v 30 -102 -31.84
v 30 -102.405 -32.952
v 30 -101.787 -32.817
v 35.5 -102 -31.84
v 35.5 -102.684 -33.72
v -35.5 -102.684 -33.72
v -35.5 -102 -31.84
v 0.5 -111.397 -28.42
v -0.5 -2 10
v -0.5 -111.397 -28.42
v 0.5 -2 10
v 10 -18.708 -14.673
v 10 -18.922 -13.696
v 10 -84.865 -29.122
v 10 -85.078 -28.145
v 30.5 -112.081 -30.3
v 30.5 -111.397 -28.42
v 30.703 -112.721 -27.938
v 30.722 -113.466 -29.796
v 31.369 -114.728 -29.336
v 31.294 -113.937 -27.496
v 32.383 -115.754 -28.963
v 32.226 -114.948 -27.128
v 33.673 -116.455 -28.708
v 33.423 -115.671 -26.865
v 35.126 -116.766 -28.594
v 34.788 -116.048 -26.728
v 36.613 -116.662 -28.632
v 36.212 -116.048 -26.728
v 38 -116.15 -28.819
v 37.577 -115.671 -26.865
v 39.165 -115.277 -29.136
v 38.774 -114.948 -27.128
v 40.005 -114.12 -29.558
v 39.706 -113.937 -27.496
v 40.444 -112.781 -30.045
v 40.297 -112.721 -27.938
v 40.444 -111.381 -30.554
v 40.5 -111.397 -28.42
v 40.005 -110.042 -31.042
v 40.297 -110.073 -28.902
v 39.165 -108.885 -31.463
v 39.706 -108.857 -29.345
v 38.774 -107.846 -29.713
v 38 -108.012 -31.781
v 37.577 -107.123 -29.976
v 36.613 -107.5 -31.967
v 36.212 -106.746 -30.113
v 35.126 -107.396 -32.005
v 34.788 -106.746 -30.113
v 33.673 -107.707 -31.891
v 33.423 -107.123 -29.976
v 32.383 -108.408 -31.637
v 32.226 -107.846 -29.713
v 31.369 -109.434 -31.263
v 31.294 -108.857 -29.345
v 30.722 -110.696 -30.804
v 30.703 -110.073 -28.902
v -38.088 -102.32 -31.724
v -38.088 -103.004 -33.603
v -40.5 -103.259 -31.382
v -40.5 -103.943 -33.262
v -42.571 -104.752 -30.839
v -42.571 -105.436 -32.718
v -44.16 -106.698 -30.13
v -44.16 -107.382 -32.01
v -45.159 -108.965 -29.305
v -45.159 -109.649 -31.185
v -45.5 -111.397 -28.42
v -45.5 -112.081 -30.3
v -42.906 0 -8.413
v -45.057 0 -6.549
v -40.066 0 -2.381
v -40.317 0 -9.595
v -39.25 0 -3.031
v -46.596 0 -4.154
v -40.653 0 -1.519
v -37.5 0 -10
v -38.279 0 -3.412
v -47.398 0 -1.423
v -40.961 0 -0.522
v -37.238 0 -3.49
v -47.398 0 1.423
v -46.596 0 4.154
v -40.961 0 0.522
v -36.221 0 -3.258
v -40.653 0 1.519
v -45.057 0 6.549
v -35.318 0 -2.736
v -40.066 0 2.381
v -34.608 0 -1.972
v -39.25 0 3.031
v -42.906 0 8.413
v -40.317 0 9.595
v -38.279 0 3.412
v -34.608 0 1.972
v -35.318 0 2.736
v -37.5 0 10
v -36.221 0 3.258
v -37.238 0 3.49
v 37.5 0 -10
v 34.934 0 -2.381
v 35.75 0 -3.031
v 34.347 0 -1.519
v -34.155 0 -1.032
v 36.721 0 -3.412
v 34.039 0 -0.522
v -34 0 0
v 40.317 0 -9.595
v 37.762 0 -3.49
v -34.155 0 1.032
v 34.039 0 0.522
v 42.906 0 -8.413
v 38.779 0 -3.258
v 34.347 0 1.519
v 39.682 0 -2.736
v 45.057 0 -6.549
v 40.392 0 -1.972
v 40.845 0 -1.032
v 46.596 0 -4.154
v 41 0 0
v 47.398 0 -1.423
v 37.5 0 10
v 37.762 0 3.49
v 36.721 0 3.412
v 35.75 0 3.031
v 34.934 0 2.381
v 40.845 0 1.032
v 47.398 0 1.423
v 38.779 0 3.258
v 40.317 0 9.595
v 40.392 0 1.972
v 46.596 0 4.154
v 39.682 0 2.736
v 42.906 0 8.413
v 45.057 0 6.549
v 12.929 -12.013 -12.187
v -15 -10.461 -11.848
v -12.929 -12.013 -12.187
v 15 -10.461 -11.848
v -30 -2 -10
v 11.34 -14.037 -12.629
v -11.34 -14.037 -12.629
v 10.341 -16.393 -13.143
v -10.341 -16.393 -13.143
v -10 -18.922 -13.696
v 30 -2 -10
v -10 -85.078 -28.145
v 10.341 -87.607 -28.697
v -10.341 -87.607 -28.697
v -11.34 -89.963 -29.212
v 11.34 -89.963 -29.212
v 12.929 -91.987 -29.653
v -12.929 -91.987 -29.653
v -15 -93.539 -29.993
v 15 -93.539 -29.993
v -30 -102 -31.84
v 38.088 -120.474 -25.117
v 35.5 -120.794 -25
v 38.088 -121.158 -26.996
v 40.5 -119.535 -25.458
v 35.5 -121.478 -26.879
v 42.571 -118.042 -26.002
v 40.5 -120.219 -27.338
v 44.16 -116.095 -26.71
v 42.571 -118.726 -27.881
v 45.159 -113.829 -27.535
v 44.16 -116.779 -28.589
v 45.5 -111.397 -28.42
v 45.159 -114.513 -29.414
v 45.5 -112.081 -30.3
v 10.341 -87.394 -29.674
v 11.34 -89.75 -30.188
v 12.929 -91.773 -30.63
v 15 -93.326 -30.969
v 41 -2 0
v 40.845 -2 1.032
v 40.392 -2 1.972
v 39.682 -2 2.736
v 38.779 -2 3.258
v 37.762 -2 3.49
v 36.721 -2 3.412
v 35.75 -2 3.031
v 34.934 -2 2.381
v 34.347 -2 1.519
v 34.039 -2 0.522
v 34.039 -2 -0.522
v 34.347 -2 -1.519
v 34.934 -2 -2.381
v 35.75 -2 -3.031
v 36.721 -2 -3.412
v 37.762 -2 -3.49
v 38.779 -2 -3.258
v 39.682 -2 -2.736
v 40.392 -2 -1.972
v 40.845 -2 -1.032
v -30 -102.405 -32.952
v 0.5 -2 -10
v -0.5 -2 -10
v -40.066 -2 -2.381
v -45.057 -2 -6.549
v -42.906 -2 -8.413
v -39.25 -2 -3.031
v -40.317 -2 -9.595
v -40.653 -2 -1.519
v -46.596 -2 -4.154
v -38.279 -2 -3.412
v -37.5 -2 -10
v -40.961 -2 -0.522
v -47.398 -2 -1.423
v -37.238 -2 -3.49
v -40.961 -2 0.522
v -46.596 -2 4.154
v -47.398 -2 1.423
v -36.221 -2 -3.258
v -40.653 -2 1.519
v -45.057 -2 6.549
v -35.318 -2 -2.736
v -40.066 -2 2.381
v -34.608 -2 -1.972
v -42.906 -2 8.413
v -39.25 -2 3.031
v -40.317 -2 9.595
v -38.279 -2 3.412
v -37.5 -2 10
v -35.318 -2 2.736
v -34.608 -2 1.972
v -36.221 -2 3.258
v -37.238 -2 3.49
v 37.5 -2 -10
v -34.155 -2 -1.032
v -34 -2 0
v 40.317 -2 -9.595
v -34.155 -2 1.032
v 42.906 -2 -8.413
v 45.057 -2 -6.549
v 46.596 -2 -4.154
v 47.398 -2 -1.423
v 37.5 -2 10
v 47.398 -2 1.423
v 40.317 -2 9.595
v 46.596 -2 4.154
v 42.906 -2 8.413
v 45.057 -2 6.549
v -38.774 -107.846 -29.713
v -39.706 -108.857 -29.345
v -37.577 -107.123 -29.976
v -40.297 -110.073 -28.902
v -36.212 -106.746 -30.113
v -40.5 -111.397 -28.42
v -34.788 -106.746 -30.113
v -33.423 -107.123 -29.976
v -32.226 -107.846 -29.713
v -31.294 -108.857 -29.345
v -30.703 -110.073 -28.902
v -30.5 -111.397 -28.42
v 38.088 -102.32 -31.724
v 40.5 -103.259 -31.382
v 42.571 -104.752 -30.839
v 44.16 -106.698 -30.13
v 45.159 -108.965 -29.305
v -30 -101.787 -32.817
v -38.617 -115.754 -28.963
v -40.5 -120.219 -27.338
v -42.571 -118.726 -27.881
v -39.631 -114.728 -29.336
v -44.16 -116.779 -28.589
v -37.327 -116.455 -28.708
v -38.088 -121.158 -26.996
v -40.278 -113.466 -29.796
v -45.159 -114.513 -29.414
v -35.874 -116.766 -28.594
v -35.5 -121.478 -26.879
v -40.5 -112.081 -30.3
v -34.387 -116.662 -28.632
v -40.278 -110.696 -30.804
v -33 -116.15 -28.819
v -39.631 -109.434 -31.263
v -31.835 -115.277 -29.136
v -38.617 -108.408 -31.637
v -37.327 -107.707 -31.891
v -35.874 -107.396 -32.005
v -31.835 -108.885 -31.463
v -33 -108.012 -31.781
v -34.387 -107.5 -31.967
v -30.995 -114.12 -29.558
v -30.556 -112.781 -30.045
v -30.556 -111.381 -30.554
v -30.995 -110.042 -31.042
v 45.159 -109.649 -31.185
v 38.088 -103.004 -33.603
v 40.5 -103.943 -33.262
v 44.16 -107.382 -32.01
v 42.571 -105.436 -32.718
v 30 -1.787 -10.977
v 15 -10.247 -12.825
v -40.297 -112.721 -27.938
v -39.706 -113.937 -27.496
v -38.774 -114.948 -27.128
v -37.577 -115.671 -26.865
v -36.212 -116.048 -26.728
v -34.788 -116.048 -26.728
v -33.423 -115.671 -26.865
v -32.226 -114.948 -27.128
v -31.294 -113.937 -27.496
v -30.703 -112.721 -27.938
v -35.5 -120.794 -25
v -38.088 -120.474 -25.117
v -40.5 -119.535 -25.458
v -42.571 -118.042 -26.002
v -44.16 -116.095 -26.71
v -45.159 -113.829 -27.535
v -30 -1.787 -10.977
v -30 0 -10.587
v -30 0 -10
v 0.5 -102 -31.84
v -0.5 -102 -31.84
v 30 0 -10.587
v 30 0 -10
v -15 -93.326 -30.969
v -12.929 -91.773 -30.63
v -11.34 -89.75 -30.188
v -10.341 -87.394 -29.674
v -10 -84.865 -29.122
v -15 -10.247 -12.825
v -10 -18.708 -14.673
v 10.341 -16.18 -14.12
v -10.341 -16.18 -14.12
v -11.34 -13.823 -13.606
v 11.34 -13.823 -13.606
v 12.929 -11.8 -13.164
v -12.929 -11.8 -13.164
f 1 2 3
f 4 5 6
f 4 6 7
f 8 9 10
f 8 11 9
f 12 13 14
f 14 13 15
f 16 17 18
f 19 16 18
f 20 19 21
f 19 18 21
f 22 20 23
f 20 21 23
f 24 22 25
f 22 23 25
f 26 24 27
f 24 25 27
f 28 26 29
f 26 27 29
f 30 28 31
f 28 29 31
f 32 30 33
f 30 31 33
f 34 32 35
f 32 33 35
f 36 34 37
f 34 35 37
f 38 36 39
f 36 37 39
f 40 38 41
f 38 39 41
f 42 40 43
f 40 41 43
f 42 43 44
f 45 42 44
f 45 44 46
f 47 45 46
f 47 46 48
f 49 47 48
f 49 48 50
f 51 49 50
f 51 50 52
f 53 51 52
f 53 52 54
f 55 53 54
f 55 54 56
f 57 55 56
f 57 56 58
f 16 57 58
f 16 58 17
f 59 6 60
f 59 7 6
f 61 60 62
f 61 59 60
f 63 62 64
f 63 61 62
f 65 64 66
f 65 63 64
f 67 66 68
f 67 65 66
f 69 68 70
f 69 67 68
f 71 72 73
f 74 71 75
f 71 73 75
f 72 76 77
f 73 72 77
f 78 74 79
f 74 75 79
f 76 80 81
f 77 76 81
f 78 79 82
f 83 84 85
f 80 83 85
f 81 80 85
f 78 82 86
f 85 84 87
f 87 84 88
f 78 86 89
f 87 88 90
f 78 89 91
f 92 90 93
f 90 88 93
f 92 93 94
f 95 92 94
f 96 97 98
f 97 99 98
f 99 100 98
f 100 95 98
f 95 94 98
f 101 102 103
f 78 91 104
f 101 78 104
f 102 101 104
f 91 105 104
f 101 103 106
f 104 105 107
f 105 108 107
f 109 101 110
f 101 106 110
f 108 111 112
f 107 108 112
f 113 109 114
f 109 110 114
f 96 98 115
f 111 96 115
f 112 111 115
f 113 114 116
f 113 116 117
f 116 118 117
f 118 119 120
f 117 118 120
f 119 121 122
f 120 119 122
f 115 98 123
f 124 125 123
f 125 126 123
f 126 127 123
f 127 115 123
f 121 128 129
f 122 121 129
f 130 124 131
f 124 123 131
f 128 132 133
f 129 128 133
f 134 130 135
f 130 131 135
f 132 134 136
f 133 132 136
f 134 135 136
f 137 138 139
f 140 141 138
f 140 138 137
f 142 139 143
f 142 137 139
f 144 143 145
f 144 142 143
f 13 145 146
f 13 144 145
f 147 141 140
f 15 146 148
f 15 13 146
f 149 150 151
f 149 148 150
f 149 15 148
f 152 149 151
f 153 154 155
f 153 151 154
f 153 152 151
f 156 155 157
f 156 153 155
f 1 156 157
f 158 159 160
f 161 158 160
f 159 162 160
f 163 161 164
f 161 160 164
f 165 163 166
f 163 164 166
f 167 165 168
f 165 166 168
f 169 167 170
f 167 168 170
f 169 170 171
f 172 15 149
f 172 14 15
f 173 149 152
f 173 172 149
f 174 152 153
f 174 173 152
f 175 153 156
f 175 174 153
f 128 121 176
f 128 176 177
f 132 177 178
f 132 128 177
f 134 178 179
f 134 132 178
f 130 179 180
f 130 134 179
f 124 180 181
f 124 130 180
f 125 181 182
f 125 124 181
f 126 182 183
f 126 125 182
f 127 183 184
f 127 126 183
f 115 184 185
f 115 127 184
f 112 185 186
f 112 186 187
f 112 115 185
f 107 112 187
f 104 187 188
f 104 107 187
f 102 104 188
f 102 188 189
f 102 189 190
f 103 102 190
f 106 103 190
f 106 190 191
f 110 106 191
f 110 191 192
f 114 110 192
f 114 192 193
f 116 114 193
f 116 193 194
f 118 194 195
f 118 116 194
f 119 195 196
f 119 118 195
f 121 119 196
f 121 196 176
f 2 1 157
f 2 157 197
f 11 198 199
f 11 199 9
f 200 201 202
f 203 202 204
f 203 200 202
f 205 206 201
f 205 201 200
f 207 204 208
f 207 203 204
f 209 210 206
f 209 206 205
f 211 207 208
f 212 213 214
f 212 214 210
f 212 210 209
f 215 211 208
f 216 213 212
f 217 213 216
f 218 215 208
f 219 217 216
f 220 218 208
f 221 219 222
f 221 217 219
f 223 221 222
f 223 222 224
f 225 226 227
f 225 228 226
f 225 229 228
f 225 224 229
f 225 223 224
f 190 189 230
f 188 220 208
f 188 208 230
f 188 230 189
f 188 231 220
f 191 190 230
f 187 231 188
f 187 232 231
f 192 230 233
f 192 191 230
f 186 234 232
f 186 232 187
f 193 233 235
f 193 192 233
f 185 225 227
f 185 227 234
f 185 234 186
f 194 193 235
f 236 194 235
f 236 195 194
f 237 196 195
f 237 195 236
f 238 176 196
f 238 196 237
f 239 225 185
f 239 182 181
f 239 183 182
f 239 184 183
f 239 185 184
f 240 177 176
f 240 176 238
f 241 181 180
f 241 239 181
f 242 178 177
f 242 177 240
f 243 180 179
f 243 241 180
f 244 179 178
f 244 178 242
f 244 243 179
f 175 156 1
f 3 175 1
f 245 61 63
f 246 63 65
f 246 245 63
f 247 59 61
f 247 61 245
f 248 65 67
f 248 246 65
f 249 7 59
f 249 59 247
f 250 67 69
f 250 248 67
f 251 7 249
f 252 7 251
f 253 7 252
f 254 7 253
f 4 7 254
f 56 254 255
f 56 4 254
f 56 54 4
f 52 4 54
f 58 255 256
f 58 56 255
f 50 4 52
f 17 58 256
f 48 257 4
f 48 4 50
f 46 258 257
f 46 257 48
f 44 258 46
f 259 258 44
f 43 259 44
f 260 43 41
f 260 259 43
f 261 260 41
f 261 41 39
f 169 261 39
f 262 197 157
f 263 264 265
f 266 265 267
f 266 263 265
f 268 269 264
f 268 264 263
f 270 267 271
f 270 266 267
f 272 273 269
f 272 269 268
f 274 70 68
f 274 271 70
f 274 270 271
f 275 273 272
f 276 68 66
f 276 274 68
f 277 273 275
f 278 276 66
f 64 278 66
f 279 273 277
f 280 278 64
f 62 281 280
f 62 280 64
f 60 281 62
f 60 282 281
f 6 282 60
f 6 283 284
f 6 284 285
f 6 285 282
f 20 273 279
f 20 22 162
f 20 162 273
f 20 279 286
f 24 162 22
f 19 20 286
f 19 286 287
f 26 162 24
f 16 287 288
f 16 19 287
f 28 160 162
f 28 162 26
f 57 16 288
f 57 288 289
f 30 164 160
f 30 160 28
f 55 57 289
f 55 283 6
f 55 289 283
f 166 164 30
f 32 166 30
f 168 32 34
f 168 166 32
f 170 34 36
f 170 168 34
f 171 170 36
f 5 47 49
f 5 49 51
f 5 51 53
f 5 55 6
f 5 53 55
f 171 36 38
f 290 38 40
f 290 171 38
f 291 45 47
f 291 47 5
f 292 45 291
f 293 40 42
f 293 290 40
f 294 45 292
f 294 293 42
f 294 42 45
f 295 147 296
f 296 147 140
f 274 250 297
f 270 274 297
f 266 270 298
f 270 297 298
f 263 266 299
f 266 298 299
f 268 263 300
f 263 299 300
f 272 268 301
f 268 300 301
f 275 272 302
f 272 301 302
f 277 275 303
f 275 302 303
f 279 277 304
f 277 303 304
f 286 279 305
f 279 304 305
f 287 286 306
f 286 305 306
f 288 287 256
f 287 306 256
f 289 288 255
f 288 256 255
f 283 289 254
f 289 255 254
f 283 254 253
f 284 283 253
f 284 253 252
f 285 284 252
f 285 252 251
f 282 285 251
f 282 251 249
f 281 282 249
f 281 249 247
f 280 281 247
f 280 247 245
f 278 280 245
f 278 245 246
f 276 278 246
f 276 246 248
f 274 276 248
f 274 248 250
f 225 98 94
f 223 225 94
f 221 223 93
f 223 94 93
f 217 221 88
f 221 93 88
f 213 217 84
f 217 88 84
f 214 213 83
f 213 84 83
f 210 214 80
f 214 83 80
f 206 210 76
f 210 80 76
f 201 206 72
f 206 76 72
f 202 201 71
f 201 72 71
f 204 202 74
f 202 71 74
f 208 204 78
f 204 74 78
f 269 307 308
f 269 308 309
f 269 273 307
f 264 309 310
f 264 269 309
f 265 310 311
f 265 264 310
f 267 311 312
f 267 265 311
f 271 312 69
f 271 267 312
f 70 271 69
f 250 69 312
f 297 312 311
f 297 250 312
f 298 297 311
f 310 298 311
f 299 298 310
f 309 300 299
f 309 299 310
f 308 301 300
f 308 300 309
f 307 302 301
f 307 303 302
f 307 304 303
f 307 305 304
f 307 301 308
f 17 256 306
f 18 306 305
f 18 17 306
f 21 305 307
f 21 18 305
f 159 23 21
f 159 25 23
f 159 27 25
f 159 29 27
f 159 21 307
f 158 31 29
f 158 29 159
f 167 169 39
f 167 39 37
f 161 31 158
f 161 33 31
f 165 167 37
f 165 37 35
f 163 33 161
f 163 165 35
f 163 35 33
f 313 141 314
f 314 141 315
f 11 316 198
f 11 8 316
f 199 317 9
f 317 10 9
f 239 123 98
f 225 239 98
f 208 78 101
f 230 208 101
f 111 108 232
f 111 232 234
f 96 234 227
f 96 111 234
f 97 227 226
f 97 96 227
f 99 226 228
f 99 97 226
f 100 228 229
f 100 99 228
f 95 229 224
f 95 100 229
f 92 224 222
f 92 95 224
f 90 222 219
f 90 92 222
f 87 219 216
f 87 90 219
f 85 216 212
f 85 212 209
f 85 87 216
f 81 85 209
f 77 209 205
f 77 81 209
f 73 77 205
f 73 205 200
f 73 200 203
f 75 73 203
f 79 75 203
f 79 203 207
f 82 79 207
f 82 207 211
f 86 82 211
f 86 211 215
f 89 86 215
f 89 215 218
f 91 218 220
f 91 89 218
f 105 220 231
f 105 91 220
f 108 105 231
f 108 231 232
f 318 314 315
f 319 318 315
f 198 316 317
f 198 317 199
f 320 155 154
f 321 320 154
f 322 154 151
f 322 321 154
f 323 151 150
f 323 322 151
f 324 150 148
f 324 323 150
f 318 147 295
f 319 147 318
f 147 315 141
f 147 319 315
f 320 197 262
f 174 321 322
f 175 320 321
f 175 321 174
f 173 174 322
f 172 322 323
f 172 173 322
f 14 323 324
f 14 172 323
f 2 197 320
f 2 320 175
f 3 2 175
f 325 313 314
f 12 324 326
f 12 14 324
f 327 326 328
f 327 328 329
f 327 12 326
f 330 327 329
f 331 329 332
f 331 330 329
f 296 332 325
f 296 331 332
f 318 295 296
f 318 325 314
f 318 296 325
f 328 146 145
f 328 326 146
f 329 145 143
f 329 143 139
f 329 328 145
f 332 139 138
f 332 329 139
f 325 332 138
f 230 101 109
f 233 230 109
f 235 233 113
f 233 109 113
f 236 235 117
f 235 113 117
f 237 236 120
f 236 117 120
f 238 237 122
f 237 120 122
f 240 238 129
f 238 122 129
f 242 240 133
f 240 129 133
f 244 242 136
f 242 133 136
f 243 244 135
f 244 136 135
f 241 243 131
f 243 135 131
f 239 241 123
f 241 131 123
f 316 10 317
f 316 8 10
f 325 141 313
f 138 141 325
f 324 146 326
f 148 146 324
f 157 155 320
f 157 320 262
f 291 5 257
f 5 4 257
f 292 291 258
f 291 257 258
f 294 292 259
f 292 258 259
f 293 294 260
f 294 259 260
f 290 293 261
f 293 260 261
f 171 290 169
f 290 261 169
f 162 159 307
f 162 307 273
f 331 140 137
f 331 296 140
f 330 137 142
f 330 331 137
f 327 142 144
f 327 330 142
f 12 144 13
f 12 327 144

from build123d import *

# Parameters (mm, degrees)
F0_R      = 3.5
F1_DEPTH  = 2
F3_DEPTH  = 0.5
F4_DEPTH  = 45.5
F5_R      = 9.99999
F7_D      = 10
F9_DEPTH  = 30
F11_DEPTH = 23.6012824615
F12_R     = 10


# Not quite as in the source:
# - a fillet or chamfer is up to 0.001 mm smaller than in the source, because OpenCascade refuses the exact size
# - a pattern or mirror of a feature is missing from the dataset's text; its kind, count and spacing are read off the source's solid


with BuildPart() as f1:
    # F0 (on Front) → F1 (new body)
    with BuildSketch(Plane.XZ):
        with BuildLine():
            Line((37.5, 10), (-37.5, 10))
            ThreePointArc((-37.5, 10), (-47.5, 0), (-37.5, -10))
            Line((-37.5, -10), (37.5, -10))
            ThreePointArc((37.5, -10), (47.5, 0), (37.5, 10))
        make_face()
        with Locations((-37.5, 0)):
            Circle(F0_R, mode=Mode.SUBTRACT)
        with Locations((37.5, 0)):
            Circle(F0_R, mode=Mode.SUBTRACT)
    extrude(amount=F1_DEPTH)


with BuildPart() as f3:
    # F2 (on Right) → F3 (new body, symmetric)
    with BuildSketch(Plane.YZ):
        Polygon((-111.3969262079, -28.4202014333), (-102, -31.8404028665), (-2, -10), (-2, 10), align=None)
    extrude(amount=F3_DEPTH, both=True)


with BuildPart() as f4:
    # F2 (on Right) → F4 (new body, symmetric)
    with BuildSketch(Plane.YZ):
        Polygon((-102.6840402867, -33.7197881081), (-102, -31.8404028665), (-111.3969262079, -28.4202014333), (-120.7938524157, -25), (-121.4778927024, -26.8793852416), align=None)
    extrude(amount=F4_DEPTH, both=True)

    # F5 (radius 10 in the source; OpenCascade refuses exactly that, so slightly less here)
    f5_edges = [f4.edges().sort_by_distance(p)[0] for p in [
        (45.5, -121.135873, -25.939693),
        (45.5, -102.34202, -32.780095),
        (-45.5, -121.135873, -25.939693),
        (-45.5, -102.34202, -32.780095),
    ]]
    fillet(f5_edges, radius=F5_R)

    # F7 (through all)
    with Locations(Plane(origin=(0, -22.8490819126, -62.7773366101), x_dir=(1, 0, 0), z_dir=(0, -0.3420201433, -0.9396926208))):
        with Locations((35.5, 94.9585881682), (-35.5, 94.9585881682)):
            Hole(F7_D / 2)


with BuildPart() as f9:
    # F8 (on Right) → F9 (new body, symmetric)
    with BuildSketch(Plane.YZ):
        Polygon((-2, -10), (-102, -31.8404028665), (-102.4047222734, -32.952368174), (0, -10.5867642751), (0, -10), align=None)
    extrude(amount=F9_DEPTH, both=True)

    # F10 (on face) → F11 (cut, through all)
    with BuildSketch(Plane(origin=(0, 1.9935468262, -9.1277932845), x_dir=(1, 0, 0), z_dir=(0, -0.2133742988, 0.976970526))):
        Polygon((30, -106.4449172836), (30, -4.0876840396), (10, -15.6346894234), (10, -94.8979118998), align=None)
    f11 = extrude(amount=-F11_DEPTH, mode=Mode.SUBTRACT)

    # F11_copies: F11 across plane
    add(f11.mirror(Plane(origin=(0, 0, 0), x_dir=(0, 0, -1), z_dir=(-1, 0, 0))), mode=Mode.SUBTRACT)

    # F12
    f12_edges = [f9.edges().sort_by_distance(p)[0] for p in [
        (10, -90.612229, -29.865054),
        (10, -13.174397, -12.952319),
        (-10, -13.174397, -12.952319),
        (-10, -90.612229, -29.865054),
    ]]
    fillet(f12_edges, radius=F12_R)


solid = Compound([f1.part, f3.part, f4.part, f9.part])
